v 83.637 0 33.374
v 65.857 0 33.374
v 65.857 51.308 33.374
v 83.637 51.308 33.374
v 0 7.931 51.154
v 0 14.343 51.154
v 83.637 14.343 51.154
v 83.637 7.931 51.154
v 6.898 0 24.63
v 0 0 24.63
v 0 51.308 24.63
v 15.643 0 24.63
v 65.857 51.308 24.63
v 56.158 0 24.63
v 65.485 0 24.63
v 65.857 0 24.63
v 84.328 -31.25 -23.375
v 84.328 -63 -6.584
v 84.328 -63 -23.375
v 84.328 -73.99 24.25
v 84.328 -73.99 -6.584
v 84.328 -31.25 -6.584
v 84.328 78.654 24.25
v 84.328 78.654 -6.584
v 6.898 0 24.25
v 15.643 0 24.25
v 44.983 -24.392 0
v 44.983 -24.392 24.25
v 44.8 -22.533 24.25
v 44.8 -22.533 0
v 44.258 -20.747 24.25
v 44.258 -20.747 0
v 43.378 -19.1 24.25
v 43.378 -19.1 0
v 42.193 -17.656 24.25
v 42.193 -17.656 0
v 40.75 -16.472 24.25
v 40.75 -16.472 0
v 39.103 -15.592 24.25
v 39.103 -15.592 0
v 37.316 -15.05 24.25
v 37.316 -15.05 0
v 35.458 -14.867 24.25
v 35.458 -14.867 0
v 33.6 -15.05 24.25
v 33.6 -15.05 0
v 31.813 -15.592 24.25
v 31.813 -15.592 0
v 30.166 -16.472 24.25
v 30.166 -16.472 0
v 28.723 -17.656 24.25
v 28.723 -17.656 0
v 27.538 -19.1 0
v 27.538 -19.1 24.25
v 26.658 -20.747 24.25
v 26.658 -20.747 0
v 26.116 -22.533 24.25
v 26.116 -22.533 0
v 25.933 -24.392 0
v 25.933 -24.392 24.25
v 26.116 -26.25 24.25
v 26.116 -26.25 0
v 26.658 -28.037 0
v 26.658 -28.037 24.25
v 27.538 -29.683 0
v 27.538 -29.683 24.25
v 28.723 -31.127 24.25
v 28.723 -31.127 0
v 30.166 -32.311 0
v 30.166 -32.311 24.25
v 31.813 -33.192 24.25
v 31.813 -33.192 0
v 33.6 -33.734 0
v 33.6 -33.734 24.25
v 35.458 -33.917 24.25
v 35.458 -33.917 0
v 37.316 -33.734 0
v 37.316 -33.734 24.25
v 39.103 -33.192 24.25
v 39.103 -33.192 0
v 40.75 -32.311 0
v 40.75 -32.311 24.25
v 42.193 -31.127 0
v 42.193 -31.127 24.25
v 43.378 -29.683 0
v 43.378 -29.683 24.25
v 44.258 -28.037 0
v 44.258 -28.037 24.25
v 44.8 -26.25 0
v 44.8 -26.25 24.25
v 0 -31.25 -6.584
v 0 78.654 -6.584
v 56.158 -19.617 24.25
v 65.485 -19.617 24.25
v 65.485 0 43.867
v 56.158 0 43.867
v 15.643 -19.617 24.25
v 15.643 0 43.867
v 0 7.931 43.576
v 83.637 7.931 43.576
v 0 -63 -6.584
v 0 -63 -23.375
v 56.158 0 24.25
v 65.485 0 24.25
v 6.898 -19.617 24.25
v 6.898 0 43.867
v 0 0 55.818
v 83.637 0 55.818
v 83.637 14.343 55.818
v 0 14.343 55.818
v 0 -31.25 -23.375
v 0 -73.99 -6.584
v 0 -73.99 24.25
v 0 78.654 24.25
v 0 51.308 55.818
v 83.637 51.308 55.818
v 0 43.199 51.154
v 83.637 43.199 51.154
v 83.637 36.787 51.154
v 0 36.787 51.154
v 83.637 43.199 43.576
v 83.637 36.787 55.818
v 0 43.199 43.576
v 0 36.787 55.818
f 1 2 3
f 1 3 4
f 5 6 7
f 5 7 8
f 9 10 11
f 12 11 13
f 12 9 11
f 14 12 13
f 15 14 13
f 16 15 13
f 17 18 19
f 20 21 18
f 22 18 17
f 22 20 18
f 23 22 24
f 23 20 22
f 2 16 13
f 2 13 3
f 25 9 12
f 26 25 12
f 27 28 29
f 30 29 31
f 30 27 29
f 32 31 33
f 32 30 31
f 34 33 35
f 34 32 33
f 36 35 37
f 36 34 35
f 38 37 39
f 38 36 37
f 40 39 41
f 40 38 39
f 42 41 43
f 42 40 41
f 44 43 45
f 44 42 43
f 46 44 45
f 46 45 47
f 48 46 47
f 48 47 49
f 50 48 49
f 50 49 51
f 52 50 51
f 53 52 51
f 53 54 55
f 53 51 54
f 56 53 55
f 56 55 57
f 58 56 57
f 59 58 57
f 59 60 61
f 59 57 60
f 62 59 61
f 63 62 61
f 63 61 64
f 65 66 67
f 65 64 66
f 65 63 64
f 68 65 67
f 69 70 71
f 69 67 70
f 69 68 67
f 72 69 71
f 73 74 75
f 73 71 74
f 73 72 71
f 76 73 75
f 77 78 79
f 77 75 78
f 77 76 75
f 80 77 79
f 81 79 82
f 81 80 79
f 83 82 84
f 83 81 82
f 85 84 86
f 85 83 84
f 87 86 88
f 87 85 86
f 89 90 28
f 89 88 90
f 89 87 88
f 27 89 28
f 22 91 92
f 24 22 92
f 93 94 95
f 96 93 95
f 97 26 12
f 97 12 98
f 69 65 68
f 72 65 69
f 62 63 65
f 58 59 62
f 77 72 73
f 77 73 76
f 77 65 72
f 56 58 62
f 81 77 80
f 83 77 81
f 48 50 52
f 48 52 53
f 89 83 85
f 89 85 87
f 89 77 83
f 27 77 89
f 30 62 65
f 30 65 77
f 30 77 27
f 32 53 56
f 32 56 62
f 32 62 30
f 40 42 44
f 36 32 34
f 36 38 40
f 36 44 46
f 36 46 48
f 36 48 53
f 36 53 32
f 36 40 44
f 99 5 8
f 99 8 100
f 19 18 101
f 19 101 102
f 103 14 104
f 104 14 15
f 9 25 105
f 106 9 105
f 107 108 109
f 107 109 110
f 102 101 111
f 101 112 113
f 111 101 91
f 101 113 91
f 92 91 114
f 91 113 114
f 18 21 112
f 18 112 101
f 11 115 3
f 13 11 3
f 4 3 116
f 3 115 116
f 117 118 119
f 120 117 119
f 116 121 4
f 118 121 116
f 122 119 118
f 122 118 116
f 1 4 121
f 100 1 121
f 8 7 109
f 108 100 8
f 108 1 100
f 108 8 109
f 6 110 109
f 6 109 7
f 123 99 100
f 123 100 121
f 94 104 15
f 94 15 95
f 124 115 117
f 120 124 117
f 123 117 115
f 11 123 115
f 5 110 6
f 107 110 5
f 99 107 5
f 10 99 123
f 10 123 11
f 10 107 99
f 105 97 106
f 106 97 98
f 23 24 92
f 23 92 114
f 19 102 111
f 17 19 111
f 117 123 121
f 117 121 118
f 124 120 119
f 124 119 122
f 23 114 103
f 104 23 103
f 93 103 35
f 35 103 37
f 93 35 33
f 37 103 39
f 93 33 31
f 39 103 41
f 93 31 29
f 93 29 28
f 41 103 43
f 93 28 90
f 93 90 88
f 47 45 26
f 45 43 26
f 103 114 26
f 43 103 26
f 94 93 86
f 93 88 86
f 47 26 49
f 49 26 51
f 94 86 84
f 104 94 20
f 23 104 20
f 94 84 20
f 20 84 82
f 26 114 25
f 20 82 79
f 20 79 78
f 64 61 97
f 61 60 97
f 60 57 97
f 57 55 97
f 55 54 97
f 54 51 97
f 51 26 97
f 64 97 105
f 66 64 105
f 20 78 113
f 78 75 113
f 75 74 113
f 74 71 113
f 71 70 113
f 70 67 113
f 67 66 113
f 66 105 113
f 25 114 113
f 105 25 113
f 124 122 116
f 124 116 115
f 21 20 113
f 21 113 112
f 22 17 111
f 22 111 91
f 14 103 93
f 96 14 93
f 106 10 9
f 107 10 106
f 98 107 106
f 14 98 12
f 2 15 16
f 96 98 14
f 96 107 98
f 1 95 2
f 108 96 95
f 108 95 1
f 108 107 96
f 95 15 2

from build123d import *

# Parameters (mm, degrees)
F1_DEPTH    = 84.328
F2_W        = 8.7442607619
F2_H        = 19.8203269392
F2_W_2      = 9.3272216618
F3_DEPTH    = 25.4
F4_T4_DEPTH = 139.3857565506
F4_T9_DEPTH = 139.9687174505
F5_R        = 9.525
F6_DEPTH    = 36.83
F8_DEPTH    = 51.308
F10_DEPTH   = 88.9


# Not quite as in the source:
# - a fillet or chamfer that OpenCascade refuses, or shapes differently, is made with other operations: its cross-section is extruded or revolved along the edge and cut away or added


with BuildPart() as f1:
    # F0 (on Right) → F1 (new body)
    with BuildSketch(Plane.YZ):
        Polygon((78.6539154417, 24.2497121325), (-73.9903064734, 24.2497121325), (-73.9903064734, -6.584421545), (-62.9999262101, -6.584421545), (-62.9999262101, -23.3752859166), (-31.2499262101, -23.3752859166), (-31.2499262101, -6.584421545), (78.6539154417, -6.584421545), align=None)
    extrude(amount=F1_DEPTH)

    # F2 (on Front) → F3 (join)
    with BuildSketch(Plane.XZ):
        with Locations((11.2704045605, 33.9568844065)):
            Rectangle(F2_W, F2_H)
        with Locations((60.8212258667, 33.9568844065)):
            Rectangle(F2_W_2, F2_H)
    extrude(amount=F3_DEPTH)

    # F4: chamfer of 25.4 on 2 edges, made by hand


with BuildPart() as f4_tool2:
    # F4_s3 → F4_t4 (new body)
    with BuildSketch(Plane.YZ.offset(80.9632828358)):
        Polygon((-25.4, 18.4670478761), (0, 43.8670478761), (-25.4, 43.8670478761), align=None)
    extrude(amount=-F4_T4_DEPTH)

    split(bisect_by=Plane.XY.offset(24.2497121325), keep=Keep.TOP)


with BuildPart() as f1_1:
    add(f1.part)

    # F4_t1: cut F4_tool2
    add(f4_tool2.part, mode=Mode.SUBTRACT)


with BuildPart() as f4_tool7:
    # F4_s8 → F4_t9 (new body)
    with BuildSketch(Plane.YZ.offset(130.8055845919)):
        Polygon((-25.4, 18.4670478761), (0, 43.8670478761), (-25.4, 43.8670478761), align=None)
    extrude(amount=-F4_T9_DEPTH)

    split(bisect_by=Plane.XY.offset(24.2497121325), keep=Keep.TOP)


with BuildPart() as f1_2:
    add(f1_1.part)

    # F4_t6: cut F4_tool7
    add(f4_tool7.part, mode=Mode.SUBTRACT)

    # F5 (on Top) → F6 (cut)
    with BuildSketch(Plane.XY):
        with Locations((35.4578830302, -24.3916343898)):
            Circle(F5_R)
    extrude(amount=F6_DEPTH, mode=Mode.SUBTRACT)

    # F7 (on Front) → F8 (join)
    with BuildSketch(Plane.XZ):
        Polygon((65.8567920327, 24.6296729892), (65.8567920327, 33.3739332855), (83.636790514, 33.3739332855), (83.636790514, 55.8175444603), (0, 55.8175444603), (0, 24.6296729892), align=None)
    extrude(amount=-F8_DEPTH)

    # F9 (on Right) → F10 (cut)
    with BuildSketch(Plane.YZ):
        Polygon((36.7869585752, 56.1090186238), (14.3433511257, 56.1090186238), (14.3433511257, 51.153935492), (7.930893451, 51.153935492), (7.930893451, 43.5755737126), (43.1994171752, 43.5755737126), (43.1994171752, 51.153935492), (36.7869585752, 51.153935492), align=None)
    extrude(amount=F10_DEPTH, mode=Mode.SUBTRACT)


solid = f1_2.part
